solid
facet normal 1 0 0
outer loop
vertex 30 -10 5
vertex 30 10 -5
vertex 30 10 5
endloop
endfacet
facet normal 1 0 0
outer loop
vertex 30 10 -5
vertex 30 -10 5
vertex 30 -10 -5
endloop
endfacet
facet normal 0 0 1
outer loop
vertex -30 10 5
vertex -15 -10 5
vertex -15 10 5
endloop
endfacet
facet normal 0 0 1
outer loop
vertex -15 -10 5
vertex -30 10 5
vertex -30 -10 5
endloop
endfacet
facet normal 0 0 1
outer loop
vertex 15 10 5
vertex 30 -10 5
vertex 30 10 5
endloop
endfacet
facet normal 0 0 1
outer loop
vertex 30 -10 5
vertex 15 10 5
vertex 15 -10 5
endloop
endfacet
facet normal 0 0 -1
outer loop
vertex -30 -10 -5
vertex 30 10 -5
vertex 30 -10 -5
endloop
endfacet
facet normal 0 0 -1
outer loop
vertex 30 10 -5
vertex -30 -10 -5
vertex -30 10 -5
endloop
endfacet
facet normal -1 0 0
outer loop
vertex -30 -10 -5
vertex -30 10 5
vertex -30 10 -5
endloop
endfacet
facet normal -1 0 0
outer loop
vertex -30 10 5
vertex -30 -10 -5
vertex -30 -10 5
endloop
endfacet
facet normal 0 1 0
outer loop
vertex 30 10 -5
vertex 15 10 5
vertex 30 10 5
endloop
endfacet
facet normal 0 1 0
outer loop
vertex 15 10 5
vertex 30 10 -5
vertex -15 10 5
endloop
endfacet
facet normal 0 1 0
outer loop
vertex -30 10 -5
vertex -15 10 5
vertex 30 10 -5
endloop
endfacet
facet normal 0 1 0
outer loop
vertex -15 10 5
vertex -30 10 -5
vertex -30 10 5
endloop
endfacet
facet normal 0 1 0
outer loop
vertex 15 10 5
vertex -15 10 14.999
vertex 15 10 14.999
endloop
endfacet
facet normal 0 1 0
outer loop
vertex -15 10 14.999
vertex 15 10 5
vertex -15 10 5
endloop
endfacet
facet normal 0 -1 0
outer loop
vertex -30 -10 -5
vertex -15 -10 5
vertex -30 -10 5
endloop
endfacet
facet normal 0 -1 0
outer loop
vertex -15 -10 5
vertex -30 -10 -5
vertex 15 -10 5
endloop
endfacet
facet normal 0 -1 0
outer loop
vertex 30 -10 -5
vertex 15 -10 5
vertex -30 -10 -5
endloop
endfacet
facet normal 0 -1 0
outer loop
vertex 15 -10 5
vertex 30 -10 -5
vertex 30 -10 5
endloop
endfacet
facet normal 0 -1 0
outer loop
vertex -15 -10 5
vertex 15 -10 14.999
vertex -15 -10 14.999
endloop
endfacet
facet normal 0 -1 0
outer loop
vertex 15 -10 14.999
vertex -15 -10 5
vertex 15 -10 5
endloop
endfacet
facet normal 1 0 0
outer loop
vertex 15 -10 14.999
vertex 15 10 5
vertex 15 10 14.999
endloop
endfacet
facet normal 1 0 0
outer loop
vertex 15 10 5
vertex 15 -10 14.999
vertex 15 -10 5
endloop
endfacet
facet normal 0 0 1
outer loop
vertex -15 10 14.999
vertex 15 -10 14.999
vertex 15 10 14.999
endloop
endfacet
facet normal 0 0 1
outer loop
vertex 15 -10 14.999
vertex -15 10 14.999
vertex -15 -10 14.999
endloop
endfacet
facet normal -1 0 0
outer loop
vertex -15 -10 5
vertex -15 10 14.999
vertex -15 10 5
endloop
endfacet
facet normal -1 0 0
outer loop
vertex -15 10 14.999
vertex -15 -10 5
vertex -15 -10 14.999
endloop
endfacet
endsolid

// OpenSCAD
cube([60,20,10],center=true);
translate([0,0,(10 - 0.001)])
    cube([30,20,10],center=true);
